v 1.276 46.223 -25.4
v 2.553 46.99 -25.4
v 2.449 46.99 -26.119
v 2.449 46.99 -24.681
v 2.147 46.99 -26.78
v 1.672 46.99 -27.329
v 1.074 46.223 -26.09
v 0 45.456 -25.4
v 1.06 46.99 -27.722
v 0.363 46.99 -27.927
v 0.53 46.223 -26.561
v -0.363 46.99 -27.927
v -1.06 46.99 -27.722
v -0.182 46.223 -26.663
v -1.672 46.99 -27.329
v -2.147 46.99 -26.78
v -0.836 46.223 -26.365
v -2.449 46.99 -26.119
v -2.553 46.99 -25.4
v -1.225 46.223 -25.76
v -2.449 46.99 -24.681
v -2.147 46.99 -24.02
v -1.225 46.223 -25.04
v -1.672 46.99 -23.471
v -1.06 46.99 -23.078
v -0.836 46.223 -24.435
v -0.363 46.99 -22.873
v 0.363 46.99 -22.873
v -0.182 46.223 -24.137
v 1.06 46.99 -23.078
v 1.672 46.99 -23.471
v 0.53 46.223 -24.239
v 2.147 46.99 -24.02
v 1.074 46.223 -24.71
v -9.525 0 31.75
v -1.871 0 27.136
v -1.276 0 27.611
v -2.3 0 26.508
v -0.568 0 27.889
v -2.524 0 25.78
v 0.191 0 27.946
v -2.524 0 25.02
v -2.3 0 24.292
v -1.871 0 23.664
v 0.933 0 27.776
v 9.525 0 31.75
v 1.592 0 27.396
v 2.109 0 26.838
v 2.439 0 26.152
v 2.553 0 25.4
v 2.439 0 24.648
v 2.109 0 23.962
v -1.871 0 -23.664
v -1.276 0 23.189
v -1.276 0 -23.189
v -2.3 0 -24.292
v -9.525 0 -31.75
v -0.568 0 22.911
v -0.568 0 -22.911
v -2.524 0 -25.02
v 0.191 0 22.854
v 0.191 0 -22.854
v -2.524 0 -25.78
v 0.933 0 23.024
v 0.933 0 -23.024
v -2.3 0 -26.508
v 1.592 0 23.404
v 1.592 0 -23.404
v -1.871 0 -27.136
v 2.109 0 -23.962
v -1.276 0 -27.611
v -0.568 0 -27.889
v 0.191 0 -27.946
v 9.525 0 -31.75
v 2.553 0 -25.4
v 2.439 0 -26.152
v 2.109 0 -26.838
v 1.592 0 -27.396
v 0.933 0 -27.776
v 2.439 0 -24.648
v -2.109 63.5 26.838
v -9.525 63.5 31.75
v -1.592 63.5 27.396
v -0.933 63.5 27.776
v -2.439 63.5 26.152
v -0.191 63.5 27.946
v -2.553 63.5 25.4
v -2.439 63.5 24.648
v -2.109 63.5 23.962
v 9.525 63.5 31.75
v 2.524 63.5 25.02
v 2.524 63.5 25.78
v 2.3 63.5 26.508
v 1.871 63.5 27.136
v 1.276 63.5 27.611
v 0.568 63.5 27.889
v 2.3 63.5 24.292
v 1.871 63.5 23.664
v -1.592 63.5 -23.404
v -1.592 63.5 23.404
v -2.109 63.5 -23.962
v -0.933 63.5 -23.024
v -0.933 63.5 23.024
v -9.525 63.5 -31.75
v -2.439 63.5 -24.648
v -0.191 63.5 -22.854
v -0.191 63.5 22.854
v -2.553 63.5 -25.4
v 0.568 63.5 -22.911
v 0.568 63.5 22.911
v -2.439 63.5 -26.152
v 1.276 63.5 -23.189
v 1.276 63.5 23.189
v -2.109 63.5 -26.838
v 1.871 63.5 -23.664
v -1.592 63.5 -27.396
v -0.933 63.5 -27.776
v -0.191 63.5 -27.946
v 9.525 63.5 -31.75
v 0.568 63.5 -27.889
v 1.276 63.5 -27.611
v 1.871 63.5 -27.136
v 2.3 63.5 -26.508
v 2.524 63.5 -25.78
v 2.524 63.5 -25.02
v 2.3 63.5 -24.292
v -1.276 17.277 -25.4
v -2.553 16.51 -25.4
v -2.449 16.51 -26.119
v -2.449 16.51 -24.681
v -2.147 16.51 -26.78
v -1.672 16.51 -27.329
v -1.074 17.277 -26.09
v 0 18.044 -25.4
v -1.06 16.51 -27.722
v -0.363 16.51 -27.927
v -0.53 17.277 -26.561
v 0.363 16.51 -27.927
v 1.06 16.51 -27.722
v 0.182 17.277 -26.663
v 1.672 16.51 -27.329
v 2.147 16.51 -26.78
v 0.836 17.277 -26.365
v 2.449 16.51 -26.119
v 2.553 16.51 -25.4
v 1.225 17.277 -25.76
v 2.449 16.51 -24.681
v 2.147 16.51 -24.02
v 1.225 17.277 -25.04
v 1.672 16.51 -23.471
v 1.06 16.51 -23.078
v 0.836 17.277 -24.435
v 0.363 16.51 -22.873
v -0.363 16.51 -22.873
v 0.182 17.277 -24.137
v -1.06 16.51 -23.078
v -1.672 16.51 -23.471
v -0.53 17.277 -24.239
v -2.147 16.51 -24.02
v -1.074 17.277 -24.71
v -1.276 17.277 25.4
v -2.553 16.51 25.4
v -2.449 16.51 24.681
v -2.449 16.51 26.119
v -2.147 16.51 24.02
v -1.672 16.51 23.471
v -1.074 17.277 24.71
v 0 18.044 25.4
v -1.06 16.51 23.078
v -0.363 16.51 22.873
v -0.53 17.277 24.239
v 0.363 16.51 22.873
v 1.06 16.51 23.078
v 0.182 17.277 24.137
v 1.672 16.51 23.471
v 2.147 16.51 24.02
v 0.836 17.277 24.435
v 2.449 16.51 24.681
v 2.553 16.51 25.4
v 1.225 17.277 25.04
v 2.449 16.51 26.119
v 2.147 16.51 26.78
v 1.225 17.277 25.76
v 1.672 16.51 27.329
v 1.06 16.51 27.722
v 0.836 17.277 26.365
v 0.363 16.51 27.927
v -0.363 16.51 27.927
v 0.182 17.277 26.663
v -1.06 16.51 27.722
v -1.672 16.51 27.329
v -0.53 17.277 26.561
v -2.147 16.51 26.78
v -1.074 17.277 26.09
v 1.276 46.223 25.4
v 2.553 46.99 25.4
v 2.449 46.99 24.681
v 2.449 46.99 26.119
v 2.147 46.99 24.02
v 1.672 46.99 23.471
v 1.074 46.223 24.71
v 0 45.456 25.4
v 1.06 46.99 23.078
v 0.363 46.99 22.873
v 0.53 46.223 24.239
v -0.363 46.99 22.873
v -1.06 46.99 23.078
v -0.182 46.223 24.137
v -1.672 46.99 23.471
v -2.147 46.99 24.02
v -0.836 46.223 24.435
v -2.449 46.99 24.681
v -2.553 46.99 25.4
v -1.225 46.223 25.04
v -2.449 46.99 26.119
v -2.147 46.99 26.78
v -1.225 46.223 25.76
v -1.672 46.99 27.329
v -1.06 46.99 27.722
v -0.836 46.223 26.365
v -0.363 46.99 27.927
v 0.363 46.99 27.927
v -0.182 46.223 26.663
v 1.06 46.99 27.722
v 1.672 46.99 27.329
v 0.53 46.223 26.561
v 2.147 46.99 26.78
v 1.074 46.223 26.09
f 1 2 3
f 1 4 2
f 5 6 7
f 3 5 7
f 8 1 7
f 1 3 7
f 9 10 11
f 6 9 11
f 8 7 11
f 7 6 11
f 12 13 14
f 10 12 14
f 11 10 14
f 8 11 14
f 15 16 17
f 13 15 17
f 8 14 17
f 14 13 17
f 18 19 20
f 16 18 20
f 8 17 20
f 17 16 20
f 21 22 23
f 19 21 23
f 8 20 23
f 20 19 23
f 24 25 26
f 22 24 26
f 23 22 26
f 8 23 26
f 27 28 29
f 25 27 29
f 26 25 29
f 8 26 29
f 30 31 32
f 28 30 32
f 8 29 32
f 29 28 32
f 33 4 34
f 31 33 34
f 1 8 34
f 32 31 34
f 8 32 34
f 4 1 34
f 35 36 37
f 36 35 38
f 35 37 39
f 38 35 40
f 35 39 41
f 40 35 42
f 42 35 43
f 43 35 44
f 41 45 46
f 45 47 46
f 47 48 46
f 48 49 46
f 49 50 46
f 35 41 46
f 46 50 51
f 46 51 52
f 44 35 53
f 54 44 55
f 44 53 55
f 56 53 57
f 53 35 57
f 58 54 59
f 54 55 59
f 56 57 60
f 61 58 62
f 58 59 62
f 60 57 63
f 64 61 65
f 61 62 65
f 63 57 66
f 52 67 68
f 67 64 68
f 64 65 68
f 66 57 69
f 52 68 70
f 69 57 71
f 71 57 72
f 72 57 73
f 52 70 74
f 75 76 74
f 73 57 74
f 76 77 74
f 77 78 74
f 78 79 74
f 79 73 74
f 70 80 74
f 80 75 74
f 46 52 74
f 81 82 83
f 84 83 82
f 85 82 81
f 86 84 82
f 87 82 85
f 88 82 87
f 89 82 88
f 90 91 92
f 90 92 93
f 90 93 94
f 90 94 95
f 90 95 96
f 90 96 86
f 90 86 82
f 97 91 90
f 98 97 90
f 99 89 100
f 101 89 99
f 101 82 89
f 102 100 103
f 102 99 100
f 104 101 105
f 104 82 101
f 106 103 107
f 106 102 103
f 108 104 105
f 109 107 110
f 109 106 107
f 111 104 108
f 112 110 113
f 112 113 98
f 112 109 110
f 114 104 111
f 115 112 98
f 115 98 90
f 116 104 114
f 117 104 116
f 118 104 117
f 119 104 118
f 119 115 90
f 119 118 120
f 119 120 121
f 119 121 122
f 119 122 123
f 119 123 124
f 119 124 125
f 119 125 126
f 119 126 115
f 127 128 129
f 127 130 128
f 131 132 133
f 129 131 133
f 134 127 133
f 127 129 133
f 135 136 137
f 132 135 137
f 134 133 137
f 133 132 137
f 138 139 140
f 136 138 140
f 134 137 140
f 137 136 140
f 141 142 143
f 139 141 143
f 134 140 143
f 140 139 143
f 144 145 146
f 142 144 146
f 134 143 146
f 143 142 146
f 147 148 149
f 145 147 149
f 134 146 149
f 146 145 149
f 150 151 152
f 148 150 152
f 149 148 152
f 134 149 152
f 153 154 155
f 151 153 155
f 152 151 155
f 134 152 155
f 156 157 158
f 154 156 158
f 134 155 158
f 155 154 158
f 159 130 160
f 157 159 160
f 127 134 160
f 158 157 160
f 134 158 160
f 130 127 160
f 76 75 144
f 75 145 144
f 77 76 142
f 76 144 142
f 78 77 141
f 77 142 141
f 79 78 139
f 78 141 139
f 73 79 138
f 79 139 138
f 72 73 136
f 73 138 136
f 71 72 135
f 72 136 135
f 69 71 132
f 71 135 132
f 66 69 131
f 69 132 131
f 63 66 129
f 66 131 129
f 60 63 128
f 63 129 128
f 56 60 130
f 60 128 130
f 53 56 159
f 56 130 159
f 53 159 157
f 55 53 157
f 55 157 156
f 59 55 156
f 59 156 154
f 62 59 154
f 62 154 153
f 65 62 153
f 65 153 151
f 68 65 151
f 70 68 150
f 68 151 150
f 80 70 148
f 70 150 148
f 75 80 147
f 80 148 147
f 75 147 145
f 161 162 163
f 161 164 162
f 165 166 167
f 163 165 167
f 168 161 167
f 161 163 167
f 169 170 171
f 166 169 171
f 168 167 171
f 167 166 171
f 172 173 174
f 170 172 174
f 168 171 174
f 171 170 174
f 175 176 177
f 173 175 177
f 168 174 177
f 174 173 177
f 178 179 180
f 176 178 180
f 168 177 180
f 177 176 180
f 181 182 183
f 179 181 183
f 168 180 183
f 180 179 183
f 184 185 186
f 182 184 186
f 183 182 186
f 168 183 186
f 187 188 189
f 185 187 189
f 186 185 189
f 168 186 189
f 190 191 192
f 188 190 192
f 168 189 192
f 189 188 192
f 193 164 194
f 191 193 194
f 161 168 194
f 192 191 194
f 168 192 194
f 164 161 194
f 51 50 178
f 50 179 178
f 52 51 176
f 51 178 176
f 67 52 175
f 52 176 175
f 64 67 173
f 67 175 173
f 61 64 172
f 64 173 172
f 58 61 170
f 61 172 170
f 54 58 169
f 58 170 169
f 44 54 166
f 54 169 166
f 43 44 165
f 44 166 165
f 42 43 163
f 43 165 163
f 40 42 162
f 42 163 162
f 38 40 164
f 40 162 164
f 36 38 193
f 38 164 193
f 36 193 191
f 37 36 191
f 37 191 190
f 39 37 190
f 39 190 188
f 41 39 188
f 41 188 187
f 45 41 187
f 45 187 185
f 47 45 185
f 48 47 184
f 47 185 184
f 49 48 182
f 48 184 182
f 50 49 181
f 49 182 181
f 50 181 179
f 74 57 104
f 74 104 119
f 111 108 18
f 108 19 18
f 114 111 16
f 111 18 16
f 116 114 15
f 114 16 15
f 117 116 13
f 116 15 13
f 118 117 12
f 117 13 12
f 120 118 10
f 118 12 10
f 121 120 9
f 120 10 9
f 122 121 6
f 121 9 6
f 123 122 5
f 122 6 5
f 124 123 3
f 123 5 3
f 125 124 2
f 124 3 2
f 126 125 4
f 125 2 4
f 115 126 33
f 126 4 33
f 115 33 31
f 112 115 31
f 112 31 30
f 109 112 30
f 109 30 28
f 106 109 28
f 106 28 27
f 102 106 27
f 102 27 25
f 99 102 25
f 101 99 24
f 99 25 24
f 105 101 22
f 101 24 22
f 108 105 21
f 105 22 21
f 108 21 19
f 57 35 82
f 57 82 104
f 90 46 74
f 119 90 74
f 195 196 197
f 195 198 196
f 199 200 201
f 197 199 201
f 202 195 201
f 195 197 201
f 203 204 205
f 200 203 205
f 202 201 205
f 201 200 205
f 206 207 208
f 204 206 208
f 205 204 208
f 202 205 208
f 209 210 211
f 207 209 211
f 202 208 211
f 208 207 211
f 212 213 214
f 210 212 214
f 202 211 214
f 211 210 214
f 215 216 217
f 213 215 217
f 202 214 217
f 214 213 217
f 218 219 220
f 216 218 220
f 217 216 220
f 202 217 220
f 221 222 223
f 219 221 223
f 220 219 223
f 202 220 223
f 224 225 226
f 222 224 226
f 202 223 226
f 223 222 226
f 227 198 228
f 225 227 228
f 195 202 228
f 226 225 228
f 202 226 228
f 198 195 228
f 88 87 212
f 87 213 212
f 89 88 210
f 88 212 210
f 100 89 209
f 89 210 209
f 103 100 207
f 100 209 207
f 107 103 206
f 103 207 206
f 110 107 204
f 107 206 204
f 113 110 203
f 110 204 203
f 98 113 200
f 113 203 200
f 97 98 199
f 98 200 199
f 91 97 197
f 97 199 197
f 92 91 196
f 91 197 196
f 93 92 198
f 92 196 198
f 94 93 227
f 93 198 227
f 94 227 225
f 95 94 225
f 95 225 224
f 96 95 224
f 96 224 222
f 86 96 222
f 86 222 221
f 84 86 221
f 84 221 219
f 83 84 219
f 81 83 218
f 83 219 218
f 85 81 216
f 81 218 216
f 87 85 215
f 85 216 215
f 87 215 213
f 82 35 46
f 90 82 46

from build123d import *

# Parameters (mm, degrees)
SKETCH1_W                   = 19.05
SKETCH1_H                   = 63.5
BOSS_EXTRUDE1_DEPTH         = 63.5
F_1_4_20_TAPPED_HOLE1_D     = 5.1054
F_1_4_20_TAPPED_HOLE1_DEPTH = 16.51
F_1_4_20_TAPPED_HOLE1_TIP   = 1.533816902
F_1_4_20_TAPPED_HOLE2_D     = 5.1054
F_1_4_20_TAPPED_HOLE2_DEPTH = 16.51
F_1_4_20_TAPPED_HOLE2_TIP   = 1.533816902


with BuildPart() as part:
    # Sketch1 → Boss-Extrude1 (new body)
    with BuildSketch(Plane(origin=(0, 0, 0), x_dir=(1, 0, 0), z_dir=(0, 1, 0))):
        Rectangle(SKETCH1_W, SKETCH1_H)
    extrude(amount=BOSS_EXTRUDE1_DEPTH)

    # 1/4-20 Tapped Hole1
    with Locations(Plane(origin=(0, 0, 0), x_dir=(-1, 0, 0), z_dir=(0, -1, 0))):
        with Locations((0, -25.4), (0, 25.4)):
            Hole(F_1_4_20_TAPPED_HOLE1_D / 2, depth=F_1_4_20_TAPPED_HOLE1_DEPTH)
            with Locations((0, 0, -(F_1_4_20_TAPPED_HOLE1_DEPTH + F_1_4_20_TAPPED_HOLE1_TIP / 2))):  # 118° drill point
                Cone(0, F_1_4_20_TAPPED_HOLE1_D / 2, F_1_4_20_TAPPED_HOLE1_TIP, mode=Mode.SUBTRACT)

    # 1/4-20 Tapped Hole2
    with Locations(Plane(origin=(0, 63.5, 0), x_dir=(1, 0, 0), z_dir=(0, 1, 0))):
        with Locations((0, 25.4), (0, -25.4)):
            Hole(F_1_4_20_TAPPED_HOLE2_D / 2, depth=F_1_4_20_TAPPED_HOLE2_DEPTH)
            with Locations((0, 0, -(F_1_4_20_TAPPED_HOLE2_DEPTH + F_1_4_20_TAPPED_HOLE2_TIP / 2))):  # 118° drill point
                Cone(0, F_1_4_20_TAPPED_HOLE2_D / 2, F_1_4_20_TAPPED_HOLE2_TIP, mode=Mode.SUBTRACT)


solid = part.part
